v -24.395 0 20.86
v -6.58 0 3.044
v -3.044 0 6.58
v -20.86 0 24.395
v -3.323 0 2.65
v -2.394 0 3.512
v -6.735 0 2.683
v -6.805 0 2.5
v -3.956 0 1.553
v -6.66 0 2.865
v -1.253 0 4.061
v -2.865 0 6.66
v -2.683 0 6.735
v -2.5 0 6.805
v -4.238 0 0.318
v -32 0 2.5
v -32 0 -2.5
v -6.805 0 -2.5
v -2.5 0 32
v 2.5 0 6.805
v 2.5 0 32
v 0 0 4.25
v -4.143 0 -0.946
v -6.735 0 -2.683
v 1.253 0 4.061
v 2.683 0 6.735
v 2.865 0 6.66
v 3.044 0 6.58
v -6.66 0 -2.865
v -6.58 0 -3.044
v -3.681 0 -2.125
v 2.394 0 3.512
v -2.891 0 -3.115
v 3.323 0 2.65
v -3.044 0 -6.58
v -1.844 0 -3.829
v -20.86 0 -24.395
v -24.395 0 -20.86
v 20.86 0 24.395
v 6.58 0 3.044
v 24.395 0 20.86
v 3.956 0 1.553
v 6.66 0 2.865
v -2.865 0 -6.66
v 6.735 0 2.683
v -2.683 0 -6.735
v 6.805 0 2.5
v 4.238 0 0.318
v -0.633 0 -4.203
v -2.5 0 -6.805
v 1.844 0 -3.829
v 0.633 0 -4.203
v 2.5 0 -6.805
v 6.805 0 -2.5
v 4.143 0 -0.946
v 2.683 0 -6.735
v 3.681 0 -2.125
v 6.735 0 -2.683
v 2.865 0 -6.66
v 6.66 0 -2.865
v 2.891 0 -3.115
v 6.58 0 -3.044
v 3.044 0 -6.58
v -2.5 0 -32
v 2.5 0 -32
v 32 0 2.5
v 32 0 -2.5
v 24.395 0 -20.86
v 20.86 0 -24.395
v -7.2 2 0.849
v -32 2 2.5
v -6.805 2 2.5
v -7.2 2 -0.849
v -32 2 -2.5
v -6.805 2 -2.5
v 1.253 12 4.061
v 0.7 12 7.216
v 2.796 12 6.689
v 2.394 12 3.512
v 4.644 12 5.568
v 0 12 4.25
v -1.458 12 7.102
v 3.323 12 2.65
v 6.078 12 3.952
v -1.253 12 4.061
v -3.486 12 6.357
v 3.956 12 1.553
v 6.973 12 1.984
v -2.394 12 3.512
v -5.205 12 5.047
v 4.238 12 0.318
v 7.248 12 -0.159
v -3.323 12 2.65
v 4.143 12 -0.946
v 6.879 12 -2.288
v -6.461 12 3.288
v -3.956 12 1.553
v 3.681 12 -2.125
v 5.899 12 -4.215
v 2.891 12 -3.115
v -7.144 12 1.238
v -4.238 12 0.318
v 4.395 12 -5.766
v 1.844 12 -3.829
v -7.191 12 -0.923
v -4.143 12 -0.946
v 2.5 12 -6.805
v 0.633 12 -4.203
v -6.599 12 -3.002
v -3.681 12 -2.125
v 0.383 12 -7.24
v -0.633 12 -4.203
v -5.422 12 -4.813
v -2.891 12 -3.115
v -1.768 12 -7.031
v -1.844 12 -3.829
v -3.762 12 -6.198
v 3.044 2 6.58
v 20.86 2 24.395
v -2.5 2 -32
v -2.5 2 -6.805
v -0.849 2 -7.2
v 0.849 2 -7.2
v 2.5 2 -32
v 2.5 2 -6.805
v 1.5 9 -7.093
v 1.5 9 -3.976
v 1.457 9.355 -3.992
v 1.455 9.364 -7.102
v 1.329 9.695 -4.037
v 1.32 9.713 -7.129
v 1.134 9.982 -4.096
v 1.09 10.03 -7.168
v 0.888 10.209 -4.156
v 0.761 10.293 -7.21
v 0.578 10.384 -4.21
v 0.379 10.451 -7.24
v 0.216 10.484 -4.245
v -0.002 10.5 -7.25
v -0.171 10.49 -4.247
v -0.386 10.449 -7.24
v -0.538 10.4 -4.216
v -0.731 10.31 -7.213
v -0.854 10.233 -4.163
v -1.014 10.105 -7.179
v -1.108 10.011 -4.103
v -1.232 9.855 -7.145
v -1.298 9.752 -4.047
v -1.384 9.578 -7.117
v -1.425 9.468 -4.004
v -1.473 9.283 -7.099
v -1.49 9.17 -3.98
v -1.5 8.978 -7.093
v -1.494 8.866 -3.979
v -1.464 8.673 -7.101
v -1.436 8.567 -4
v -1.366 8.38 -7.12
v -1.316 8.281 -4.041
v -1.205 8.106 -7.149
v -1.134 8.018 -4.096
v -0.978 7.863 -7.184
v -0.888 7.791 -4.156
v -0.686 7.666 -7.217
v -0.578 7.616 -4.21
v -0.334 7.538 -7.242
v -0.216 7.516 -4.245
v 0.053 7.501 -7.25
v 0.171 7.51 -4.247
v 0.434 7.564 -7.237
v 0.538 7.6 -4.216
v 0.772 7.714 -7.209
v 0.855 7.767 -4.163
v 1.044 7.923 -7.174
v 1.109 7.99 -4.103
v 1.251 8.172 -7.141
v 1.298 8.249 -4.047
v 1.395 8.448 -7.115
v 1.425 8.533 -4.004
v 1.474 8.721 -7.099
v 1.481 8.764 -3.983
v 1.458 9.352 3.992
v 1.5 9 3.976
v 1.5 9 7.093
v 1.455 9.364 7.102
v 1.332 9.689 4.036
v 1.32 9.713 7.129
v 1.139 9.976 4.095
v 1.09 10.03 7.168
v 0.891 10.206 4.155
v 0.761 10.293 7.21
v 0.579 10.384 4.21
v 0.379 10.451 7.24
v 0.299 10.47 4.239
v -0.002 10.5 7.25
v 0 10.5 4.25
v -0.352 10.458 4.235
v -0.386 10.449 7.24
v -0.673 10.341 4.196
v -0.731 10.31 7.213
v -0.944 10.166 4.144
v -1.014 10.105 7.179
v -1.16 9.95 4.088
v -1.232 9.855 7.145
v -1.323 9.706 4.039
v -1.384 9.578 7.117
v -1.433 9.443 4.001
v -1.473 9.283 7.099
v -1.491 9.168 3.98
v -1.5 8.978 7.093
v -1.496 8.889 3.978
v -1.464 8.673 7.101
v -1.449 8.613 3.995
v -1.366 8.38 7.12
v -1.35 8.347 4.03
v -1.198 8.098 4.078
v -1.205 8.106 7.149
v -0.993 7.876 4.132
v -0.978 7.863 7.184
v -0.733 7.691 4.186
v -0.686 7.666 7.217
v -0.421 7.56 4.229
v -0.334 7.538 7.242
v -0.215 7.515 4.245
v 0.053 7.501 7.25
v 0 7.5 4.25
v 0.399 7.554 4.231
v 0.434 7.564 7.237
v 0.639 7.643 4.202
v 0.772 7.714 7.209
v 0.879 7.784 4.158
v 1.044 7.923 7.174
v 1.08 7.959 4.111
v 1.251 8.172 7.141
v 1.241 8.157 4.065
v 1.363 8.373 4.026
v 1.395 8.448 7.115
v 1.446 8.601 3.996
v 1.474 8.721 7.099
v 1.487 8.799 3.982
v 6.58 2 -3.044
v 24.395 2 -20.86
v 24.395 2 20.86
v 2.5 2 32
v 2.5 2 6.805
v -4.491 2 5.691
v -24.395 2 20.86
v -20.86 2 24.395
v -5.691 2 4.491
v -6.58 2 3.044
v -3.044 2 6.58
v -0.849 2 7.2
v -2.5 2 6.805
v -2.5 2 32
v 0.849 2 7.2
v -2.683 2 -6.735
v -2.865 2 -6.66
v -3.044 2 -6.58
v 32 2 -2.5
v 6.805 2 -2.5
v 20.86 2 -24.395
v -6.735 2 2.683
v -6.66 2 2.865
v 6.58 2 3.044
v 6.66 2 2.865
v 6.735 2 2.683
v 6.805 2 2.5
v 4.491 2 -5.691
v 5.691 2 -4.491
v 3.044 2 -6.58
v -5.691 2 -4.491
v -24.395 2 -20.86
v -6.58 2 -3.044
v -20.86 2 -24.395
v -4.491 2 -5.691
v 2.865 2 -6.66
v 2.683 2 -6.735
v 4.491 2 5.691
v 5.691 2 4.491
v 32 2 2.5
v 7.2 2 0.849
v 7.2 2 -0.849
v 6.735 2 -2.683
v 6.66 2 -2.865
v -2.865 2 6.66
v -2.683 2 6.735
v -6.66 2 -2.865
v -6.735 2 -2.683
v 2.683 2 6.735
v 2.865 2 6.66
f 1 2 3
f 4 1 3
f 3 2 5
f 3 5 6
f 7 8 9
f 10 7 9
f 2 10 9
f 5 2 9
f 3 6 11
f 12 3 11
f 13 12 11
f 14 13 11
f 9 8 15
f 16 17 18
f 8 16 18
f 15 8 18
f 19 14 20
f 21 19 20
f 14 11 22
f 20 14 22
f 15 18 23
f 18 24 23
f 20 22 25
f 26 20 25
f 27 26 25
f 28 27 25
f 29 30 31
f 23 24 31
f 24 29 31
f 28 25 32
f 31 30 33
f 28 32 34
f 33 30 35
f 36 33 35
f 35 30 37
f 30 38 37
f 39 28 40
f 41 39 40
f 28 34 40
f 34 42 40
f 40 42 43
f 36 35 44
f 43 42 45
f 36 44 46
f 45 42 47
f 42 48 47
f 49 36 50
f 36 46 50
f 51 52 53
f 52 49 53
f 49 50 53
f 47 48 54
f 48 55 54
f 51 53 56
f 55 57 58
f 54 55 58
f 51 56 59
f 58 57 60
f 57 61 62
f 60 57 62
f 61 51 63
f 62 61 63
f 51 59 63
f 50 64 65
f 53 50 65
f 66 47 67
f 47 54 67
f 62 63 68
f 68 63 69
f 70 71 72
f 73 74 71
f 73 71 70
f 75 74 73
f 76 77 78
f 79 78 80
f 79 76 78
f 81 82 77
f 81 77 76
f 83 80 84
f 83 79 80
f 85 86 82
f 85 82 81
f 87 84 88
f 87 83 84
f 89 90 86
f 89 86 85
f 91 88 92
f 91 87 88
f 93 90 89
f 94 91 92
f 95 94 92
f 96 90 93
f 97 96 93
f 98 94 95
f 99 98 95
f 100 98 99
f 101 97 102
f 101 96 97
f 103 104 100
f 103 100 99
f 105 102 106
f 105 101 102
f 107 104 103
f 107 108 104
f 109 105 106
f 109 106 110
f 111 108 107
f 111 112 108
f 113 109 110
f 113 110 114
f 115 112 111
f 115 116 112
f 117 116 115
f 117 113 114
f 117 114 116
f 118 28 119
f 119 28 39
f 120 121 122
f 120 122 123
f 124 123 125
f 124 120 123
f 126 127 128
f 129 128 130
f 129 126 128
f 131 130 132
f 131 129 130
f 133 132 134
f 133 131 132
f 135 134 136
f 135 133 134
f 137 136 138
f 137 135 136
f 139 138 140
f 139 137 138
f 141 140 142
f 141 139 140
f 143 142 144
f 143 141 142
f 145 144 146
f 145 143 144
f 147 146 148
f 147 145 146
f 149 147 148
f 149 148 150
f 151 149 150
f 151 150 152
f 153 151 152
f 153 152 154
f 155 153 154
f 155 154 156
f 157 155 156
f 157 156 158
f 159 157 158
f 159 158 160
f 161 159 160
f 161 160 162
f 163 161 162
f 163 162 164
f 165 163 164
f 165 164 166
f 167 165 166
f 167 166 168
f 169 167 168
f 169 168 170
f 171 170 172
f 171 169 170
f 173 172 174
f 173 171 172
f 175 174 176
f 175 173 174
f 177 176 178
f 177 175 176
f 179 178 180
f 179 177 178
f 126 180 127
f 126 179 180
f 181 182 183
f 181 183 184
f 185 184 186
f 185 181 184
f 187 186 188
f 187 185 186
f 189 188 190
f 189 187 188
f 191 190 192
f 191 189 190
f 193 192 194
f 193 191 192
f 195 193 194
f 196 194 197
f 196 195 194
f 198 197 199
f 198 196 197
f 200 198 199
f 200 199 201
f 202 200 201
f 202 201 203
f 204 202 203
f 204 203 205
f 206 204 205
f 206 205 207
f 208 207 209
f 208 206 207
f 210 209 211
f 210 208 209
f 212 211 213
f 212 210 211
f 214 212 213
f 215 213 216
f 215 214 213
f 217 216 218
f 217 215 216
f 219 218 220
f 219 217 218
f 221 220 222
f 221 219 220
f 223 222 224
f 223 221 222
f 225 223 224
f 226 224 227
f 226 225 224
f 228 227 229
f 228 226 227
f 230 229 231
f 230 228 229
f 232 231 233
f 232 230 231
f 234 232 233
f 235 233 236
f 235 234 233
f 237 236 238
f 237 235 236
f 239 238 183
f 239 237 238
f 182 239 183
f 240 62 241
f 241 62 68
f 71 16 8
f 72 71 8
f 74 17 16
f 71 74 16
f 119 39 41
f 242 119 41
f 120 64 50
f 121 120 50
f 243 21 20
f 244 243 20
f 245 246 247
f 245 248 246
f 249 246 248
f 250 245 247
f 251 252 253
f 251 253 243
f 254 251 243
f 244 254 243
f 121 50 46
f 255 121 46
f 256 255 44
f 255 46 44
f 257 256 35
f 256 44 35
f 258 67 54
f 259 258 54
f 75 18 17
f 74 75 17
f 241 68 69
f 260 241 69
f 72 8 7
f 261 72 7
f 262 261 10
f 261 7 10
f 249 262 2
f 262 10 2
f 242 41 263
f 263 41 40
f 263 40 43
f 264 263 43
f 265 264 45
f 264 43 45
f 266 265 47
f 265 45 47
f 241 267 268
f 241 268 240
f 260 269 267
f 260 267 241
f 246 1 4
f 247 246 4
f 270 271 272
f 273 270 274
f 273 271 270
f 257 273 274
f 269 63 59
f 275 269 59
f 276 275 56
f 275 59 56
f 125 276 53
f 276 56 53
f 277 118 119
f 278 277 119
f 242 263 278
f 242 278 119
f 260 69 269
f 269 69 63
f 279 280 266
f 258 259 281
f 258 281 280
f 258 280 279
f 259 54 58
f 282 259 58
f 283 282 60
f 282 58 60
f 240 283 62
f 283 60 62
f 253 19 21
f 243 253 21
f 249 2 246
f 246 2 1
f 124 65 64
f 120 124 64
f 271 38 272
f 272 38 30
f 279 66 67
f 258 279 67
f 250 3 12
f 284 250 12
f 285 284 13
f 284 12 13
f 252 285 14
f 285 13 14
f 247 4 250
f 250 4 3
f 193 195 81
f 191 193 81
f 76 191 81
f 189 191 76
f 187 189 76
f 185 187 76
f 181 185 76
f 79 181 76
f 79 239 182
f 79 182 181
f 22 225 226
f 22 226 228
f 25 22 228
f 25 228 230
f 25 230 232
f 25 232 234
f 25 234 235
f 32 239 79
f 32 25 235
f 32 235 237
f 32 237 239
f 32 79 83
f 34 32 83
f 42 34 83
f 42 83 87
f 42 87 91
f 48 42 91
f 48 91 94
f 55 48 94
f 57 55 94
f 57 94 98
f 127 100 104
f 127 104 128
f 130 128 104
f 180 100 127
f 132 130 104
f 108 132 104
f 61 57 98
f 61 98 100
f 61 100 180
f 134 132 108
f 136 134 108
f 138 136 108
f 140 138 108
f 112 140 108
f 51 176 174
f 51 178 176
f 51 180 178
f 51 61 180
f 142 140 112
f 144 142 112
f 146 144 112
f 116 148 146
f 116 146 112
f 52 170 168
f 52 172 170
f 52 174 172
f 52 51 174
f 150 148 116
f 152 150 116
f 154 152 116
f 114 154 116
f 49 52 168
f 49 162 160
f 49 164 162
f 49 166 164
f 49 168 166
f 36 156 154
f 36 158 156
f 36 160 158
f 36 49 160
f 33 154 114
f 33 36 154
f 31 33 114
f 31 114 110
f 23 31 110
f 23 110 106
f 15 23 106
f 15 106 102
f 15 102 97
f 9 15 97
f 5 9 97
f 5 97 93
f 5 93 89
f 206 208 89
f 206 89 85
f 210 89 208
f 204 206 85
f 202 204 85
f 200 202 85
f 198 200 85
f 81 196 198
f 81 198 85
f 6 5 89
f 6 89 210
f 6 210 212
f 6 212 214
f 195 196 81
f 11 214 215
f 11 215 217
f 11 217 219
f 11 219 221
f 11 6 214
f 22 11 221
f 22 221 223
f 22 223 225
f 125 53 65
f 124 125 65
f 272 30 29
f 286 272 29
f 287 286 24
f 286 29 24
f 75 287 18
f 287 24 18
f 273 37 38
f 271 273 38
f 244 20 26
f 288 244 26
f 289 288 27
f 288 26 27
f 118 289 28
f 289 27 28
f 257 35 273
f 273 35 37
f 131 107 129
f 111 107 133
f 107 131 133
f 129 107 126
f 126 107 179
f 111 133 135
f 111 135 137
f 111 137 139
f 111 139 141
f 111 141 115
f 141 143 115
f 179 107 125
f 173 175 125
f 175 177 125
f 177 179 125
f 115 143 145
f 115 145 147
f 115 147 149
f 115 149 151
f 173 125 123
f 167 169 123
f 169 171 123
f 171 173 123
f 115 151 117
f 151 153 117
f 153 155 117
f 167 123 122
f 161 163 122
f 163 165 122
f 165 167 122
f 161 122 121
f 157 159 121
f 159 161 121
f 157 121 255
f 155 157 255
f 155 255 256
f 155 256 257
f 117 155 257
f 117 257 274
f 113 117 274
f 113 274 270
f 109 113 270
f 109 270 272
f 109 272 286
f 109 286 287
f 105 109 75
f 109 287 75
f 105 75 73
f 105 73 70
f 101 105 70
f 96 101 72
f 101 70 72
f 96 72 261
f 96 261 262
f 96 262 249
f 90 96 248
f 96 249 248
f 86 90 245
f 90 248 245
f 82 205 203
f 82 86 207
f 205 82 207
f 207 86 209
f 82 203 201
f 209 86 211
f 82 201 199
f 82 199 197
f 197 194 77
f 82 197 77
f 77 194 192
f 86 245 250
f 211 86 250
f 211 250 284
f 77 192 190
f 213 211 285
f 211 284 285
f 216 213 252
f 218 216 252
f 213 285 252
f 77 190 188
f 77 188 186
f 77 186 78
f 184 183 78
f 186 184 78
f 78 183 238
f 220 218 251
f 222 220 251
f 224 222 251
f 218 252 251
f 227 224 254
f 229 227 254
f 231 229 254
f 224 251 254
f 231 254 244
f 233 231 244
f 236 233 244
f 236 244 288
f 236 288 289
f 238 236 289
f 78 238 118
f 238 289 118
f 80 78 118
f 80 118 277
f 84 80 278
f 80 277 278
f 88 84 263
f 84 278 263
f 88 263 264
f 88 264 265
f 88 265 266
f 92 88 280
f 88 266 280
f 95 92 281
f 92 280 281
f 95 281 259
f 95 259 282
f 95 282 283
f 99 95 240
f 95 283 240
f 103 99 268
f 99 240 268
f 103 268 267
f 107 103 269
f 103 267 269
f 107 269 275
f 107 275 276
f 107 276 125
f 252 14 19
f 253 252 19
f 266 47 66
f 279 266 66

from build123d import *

# Parameters (mm, degrees)
SKETCH1_R               = 4.25
BOSS_EXTRUDE1_DEPTH     = 2
SKETCH1_3_R             = 7.25
SKETCH1_3_R_2           = 4.25
BOSS_EXTRUDE2_DEPTH     = 12
CUT_EXTRUDE1_DEPTH      = 47.818799643
CUT_EXTRUDE1_DEPTH_BACK = 47.818799643
SKETCH2_R               = 1.5


with BuildPart() as part:
    # Sketch1 → Boss-Extrude1 (new body)
    with BuildSketch(Plane(origin=(0, 0, 0), x_dir=(1, 0, 0), z_dir=(0, 1, 0))):
        with BuildLine():
            ThreePointArc((-2.5, 6.805328794), (-2.774454885, 6.698126611), (-3.044327186, 6.579861092))
            Line((-3.044327186, 6.579861092), (-20.859650045, 24.395183951))
            Line((-20.859650045, 24.395183951), (-24.395183951, 20.859650045))
            Line((-24.395183951, 20.859650045), (-6.579861092, 3.044327186))
            ThreePointArc((-6.579861092, 3.044327186), (-6.698126611, 2.774454885), (-6.805328794, 2.5))
            Line((-6.805328794, 2.5), (-32, 2.5))
            Line((-32, 2.5), (-32, -2.5))
            Line((-32, -2.5), (-6.805328794, -2.5))
            ThreePointArc((-6.805328794, -2.5), (-6.698126611, -2.774454885), (-6.579861092, -3.044327186))
            Line((-6.579861092, -3.044327186), (-24.395183951, -20.859650045))
            Line((-24.395183951, -20.859650045), (-20.859650045, -24.395183951))
            Line((-20.859650045, -24.395183951), (-3.044327186, -6.579861092))
            ThreePointArc((-3.044327186, -6.579861092), (-2.774454885, -6.698126611), (-2.5, -6.805328794))
            Line((-2.5, -6.805328794), (-2.5, -32))
            Line((-2.5, -32), (2.5, -32))
            Line((2.5, -32), (2.5, -6.805328794))
            ThreePointArc((2.5, -6.805328794), (2.774454885, -6.698126611), (3.044327186, -6.579861092))
            Line((3.044327186, -6.579861092), (20.859650045, -24.395183951))
            Line((20.859650045, -24.395183951), (24.395183951, -20.859650045))
            Line((24.395183951, -20.859650045), (6.579861092, -3.044327186))
            ThreePointArc((6.579861092, -3.044327186), (6.698126611, -2.774454885), (6.805328794, -2.5))
            Line((6.805328794, -2.5), (32, -2.5))
            Line((32, -2.5), (32, 2.5))
            Line((32, 2.5), (6.805328794, 2.5))
            ThreePointArc((6.805328794, 2.5), (6.698126611, 2.774454885), (6.579861092, 3.044327186))
            Line((6.579861092, 3.044327186), (24.395183951, 20.859650045))
            Line((24.395183951, 20.859650045), (20.859650045, 24.395183951))
            Line((20.859650045, 24.395183951), (3.044327186, 6.579861092))
            ThreePointArc((3.044327186, 6.579861092), (2.774454885, 6.698126611), (2.5, 6.805328794))
            Line((2.5, 6.805328794), (2.5, 32))
            Line((2.5, 32), (-2.5, 32))
            Line((-2.5, 32), (-2.5, 6.805328794))
        make_face()
        Circle(SKETCH1_R, mode=Mode.SUBTRACT)
    extrude(amount=BOSS_EXTRUDE1_DEPTH)

    # Sketch1<3> → Boss-Extrude2 (add)
    with BuildSketch(Plane(origin=(0, 0, 0), x_dir=(1, 0, 0), z_dir=(0, 1, 0))):
        Circle(SKETCH1_3_R)
        Circle(SKETCH1_3_R_2, mode=Mode.SUBTRACT)
    extrude(amount=BOSS_EXTRUDE2_DEPTH)

    # Sketch2 → Cut-Extrude1 (cut, two sides: drawn at the far end of the back side and taken through both)
    with BuildSketch(Plane.XY.offset(-CUT_EXTRUDE1_DEPTH_BACK)):
        with Locations((0, 9)):
            Circle(SKETCH2_R)
    extrude(amount=CUT_EXTRUDE1_DEPTH + CUT_EXTRUDE1_DEPTH_BACK, mode=Mode.SUBTRACT)


solid = part.part
